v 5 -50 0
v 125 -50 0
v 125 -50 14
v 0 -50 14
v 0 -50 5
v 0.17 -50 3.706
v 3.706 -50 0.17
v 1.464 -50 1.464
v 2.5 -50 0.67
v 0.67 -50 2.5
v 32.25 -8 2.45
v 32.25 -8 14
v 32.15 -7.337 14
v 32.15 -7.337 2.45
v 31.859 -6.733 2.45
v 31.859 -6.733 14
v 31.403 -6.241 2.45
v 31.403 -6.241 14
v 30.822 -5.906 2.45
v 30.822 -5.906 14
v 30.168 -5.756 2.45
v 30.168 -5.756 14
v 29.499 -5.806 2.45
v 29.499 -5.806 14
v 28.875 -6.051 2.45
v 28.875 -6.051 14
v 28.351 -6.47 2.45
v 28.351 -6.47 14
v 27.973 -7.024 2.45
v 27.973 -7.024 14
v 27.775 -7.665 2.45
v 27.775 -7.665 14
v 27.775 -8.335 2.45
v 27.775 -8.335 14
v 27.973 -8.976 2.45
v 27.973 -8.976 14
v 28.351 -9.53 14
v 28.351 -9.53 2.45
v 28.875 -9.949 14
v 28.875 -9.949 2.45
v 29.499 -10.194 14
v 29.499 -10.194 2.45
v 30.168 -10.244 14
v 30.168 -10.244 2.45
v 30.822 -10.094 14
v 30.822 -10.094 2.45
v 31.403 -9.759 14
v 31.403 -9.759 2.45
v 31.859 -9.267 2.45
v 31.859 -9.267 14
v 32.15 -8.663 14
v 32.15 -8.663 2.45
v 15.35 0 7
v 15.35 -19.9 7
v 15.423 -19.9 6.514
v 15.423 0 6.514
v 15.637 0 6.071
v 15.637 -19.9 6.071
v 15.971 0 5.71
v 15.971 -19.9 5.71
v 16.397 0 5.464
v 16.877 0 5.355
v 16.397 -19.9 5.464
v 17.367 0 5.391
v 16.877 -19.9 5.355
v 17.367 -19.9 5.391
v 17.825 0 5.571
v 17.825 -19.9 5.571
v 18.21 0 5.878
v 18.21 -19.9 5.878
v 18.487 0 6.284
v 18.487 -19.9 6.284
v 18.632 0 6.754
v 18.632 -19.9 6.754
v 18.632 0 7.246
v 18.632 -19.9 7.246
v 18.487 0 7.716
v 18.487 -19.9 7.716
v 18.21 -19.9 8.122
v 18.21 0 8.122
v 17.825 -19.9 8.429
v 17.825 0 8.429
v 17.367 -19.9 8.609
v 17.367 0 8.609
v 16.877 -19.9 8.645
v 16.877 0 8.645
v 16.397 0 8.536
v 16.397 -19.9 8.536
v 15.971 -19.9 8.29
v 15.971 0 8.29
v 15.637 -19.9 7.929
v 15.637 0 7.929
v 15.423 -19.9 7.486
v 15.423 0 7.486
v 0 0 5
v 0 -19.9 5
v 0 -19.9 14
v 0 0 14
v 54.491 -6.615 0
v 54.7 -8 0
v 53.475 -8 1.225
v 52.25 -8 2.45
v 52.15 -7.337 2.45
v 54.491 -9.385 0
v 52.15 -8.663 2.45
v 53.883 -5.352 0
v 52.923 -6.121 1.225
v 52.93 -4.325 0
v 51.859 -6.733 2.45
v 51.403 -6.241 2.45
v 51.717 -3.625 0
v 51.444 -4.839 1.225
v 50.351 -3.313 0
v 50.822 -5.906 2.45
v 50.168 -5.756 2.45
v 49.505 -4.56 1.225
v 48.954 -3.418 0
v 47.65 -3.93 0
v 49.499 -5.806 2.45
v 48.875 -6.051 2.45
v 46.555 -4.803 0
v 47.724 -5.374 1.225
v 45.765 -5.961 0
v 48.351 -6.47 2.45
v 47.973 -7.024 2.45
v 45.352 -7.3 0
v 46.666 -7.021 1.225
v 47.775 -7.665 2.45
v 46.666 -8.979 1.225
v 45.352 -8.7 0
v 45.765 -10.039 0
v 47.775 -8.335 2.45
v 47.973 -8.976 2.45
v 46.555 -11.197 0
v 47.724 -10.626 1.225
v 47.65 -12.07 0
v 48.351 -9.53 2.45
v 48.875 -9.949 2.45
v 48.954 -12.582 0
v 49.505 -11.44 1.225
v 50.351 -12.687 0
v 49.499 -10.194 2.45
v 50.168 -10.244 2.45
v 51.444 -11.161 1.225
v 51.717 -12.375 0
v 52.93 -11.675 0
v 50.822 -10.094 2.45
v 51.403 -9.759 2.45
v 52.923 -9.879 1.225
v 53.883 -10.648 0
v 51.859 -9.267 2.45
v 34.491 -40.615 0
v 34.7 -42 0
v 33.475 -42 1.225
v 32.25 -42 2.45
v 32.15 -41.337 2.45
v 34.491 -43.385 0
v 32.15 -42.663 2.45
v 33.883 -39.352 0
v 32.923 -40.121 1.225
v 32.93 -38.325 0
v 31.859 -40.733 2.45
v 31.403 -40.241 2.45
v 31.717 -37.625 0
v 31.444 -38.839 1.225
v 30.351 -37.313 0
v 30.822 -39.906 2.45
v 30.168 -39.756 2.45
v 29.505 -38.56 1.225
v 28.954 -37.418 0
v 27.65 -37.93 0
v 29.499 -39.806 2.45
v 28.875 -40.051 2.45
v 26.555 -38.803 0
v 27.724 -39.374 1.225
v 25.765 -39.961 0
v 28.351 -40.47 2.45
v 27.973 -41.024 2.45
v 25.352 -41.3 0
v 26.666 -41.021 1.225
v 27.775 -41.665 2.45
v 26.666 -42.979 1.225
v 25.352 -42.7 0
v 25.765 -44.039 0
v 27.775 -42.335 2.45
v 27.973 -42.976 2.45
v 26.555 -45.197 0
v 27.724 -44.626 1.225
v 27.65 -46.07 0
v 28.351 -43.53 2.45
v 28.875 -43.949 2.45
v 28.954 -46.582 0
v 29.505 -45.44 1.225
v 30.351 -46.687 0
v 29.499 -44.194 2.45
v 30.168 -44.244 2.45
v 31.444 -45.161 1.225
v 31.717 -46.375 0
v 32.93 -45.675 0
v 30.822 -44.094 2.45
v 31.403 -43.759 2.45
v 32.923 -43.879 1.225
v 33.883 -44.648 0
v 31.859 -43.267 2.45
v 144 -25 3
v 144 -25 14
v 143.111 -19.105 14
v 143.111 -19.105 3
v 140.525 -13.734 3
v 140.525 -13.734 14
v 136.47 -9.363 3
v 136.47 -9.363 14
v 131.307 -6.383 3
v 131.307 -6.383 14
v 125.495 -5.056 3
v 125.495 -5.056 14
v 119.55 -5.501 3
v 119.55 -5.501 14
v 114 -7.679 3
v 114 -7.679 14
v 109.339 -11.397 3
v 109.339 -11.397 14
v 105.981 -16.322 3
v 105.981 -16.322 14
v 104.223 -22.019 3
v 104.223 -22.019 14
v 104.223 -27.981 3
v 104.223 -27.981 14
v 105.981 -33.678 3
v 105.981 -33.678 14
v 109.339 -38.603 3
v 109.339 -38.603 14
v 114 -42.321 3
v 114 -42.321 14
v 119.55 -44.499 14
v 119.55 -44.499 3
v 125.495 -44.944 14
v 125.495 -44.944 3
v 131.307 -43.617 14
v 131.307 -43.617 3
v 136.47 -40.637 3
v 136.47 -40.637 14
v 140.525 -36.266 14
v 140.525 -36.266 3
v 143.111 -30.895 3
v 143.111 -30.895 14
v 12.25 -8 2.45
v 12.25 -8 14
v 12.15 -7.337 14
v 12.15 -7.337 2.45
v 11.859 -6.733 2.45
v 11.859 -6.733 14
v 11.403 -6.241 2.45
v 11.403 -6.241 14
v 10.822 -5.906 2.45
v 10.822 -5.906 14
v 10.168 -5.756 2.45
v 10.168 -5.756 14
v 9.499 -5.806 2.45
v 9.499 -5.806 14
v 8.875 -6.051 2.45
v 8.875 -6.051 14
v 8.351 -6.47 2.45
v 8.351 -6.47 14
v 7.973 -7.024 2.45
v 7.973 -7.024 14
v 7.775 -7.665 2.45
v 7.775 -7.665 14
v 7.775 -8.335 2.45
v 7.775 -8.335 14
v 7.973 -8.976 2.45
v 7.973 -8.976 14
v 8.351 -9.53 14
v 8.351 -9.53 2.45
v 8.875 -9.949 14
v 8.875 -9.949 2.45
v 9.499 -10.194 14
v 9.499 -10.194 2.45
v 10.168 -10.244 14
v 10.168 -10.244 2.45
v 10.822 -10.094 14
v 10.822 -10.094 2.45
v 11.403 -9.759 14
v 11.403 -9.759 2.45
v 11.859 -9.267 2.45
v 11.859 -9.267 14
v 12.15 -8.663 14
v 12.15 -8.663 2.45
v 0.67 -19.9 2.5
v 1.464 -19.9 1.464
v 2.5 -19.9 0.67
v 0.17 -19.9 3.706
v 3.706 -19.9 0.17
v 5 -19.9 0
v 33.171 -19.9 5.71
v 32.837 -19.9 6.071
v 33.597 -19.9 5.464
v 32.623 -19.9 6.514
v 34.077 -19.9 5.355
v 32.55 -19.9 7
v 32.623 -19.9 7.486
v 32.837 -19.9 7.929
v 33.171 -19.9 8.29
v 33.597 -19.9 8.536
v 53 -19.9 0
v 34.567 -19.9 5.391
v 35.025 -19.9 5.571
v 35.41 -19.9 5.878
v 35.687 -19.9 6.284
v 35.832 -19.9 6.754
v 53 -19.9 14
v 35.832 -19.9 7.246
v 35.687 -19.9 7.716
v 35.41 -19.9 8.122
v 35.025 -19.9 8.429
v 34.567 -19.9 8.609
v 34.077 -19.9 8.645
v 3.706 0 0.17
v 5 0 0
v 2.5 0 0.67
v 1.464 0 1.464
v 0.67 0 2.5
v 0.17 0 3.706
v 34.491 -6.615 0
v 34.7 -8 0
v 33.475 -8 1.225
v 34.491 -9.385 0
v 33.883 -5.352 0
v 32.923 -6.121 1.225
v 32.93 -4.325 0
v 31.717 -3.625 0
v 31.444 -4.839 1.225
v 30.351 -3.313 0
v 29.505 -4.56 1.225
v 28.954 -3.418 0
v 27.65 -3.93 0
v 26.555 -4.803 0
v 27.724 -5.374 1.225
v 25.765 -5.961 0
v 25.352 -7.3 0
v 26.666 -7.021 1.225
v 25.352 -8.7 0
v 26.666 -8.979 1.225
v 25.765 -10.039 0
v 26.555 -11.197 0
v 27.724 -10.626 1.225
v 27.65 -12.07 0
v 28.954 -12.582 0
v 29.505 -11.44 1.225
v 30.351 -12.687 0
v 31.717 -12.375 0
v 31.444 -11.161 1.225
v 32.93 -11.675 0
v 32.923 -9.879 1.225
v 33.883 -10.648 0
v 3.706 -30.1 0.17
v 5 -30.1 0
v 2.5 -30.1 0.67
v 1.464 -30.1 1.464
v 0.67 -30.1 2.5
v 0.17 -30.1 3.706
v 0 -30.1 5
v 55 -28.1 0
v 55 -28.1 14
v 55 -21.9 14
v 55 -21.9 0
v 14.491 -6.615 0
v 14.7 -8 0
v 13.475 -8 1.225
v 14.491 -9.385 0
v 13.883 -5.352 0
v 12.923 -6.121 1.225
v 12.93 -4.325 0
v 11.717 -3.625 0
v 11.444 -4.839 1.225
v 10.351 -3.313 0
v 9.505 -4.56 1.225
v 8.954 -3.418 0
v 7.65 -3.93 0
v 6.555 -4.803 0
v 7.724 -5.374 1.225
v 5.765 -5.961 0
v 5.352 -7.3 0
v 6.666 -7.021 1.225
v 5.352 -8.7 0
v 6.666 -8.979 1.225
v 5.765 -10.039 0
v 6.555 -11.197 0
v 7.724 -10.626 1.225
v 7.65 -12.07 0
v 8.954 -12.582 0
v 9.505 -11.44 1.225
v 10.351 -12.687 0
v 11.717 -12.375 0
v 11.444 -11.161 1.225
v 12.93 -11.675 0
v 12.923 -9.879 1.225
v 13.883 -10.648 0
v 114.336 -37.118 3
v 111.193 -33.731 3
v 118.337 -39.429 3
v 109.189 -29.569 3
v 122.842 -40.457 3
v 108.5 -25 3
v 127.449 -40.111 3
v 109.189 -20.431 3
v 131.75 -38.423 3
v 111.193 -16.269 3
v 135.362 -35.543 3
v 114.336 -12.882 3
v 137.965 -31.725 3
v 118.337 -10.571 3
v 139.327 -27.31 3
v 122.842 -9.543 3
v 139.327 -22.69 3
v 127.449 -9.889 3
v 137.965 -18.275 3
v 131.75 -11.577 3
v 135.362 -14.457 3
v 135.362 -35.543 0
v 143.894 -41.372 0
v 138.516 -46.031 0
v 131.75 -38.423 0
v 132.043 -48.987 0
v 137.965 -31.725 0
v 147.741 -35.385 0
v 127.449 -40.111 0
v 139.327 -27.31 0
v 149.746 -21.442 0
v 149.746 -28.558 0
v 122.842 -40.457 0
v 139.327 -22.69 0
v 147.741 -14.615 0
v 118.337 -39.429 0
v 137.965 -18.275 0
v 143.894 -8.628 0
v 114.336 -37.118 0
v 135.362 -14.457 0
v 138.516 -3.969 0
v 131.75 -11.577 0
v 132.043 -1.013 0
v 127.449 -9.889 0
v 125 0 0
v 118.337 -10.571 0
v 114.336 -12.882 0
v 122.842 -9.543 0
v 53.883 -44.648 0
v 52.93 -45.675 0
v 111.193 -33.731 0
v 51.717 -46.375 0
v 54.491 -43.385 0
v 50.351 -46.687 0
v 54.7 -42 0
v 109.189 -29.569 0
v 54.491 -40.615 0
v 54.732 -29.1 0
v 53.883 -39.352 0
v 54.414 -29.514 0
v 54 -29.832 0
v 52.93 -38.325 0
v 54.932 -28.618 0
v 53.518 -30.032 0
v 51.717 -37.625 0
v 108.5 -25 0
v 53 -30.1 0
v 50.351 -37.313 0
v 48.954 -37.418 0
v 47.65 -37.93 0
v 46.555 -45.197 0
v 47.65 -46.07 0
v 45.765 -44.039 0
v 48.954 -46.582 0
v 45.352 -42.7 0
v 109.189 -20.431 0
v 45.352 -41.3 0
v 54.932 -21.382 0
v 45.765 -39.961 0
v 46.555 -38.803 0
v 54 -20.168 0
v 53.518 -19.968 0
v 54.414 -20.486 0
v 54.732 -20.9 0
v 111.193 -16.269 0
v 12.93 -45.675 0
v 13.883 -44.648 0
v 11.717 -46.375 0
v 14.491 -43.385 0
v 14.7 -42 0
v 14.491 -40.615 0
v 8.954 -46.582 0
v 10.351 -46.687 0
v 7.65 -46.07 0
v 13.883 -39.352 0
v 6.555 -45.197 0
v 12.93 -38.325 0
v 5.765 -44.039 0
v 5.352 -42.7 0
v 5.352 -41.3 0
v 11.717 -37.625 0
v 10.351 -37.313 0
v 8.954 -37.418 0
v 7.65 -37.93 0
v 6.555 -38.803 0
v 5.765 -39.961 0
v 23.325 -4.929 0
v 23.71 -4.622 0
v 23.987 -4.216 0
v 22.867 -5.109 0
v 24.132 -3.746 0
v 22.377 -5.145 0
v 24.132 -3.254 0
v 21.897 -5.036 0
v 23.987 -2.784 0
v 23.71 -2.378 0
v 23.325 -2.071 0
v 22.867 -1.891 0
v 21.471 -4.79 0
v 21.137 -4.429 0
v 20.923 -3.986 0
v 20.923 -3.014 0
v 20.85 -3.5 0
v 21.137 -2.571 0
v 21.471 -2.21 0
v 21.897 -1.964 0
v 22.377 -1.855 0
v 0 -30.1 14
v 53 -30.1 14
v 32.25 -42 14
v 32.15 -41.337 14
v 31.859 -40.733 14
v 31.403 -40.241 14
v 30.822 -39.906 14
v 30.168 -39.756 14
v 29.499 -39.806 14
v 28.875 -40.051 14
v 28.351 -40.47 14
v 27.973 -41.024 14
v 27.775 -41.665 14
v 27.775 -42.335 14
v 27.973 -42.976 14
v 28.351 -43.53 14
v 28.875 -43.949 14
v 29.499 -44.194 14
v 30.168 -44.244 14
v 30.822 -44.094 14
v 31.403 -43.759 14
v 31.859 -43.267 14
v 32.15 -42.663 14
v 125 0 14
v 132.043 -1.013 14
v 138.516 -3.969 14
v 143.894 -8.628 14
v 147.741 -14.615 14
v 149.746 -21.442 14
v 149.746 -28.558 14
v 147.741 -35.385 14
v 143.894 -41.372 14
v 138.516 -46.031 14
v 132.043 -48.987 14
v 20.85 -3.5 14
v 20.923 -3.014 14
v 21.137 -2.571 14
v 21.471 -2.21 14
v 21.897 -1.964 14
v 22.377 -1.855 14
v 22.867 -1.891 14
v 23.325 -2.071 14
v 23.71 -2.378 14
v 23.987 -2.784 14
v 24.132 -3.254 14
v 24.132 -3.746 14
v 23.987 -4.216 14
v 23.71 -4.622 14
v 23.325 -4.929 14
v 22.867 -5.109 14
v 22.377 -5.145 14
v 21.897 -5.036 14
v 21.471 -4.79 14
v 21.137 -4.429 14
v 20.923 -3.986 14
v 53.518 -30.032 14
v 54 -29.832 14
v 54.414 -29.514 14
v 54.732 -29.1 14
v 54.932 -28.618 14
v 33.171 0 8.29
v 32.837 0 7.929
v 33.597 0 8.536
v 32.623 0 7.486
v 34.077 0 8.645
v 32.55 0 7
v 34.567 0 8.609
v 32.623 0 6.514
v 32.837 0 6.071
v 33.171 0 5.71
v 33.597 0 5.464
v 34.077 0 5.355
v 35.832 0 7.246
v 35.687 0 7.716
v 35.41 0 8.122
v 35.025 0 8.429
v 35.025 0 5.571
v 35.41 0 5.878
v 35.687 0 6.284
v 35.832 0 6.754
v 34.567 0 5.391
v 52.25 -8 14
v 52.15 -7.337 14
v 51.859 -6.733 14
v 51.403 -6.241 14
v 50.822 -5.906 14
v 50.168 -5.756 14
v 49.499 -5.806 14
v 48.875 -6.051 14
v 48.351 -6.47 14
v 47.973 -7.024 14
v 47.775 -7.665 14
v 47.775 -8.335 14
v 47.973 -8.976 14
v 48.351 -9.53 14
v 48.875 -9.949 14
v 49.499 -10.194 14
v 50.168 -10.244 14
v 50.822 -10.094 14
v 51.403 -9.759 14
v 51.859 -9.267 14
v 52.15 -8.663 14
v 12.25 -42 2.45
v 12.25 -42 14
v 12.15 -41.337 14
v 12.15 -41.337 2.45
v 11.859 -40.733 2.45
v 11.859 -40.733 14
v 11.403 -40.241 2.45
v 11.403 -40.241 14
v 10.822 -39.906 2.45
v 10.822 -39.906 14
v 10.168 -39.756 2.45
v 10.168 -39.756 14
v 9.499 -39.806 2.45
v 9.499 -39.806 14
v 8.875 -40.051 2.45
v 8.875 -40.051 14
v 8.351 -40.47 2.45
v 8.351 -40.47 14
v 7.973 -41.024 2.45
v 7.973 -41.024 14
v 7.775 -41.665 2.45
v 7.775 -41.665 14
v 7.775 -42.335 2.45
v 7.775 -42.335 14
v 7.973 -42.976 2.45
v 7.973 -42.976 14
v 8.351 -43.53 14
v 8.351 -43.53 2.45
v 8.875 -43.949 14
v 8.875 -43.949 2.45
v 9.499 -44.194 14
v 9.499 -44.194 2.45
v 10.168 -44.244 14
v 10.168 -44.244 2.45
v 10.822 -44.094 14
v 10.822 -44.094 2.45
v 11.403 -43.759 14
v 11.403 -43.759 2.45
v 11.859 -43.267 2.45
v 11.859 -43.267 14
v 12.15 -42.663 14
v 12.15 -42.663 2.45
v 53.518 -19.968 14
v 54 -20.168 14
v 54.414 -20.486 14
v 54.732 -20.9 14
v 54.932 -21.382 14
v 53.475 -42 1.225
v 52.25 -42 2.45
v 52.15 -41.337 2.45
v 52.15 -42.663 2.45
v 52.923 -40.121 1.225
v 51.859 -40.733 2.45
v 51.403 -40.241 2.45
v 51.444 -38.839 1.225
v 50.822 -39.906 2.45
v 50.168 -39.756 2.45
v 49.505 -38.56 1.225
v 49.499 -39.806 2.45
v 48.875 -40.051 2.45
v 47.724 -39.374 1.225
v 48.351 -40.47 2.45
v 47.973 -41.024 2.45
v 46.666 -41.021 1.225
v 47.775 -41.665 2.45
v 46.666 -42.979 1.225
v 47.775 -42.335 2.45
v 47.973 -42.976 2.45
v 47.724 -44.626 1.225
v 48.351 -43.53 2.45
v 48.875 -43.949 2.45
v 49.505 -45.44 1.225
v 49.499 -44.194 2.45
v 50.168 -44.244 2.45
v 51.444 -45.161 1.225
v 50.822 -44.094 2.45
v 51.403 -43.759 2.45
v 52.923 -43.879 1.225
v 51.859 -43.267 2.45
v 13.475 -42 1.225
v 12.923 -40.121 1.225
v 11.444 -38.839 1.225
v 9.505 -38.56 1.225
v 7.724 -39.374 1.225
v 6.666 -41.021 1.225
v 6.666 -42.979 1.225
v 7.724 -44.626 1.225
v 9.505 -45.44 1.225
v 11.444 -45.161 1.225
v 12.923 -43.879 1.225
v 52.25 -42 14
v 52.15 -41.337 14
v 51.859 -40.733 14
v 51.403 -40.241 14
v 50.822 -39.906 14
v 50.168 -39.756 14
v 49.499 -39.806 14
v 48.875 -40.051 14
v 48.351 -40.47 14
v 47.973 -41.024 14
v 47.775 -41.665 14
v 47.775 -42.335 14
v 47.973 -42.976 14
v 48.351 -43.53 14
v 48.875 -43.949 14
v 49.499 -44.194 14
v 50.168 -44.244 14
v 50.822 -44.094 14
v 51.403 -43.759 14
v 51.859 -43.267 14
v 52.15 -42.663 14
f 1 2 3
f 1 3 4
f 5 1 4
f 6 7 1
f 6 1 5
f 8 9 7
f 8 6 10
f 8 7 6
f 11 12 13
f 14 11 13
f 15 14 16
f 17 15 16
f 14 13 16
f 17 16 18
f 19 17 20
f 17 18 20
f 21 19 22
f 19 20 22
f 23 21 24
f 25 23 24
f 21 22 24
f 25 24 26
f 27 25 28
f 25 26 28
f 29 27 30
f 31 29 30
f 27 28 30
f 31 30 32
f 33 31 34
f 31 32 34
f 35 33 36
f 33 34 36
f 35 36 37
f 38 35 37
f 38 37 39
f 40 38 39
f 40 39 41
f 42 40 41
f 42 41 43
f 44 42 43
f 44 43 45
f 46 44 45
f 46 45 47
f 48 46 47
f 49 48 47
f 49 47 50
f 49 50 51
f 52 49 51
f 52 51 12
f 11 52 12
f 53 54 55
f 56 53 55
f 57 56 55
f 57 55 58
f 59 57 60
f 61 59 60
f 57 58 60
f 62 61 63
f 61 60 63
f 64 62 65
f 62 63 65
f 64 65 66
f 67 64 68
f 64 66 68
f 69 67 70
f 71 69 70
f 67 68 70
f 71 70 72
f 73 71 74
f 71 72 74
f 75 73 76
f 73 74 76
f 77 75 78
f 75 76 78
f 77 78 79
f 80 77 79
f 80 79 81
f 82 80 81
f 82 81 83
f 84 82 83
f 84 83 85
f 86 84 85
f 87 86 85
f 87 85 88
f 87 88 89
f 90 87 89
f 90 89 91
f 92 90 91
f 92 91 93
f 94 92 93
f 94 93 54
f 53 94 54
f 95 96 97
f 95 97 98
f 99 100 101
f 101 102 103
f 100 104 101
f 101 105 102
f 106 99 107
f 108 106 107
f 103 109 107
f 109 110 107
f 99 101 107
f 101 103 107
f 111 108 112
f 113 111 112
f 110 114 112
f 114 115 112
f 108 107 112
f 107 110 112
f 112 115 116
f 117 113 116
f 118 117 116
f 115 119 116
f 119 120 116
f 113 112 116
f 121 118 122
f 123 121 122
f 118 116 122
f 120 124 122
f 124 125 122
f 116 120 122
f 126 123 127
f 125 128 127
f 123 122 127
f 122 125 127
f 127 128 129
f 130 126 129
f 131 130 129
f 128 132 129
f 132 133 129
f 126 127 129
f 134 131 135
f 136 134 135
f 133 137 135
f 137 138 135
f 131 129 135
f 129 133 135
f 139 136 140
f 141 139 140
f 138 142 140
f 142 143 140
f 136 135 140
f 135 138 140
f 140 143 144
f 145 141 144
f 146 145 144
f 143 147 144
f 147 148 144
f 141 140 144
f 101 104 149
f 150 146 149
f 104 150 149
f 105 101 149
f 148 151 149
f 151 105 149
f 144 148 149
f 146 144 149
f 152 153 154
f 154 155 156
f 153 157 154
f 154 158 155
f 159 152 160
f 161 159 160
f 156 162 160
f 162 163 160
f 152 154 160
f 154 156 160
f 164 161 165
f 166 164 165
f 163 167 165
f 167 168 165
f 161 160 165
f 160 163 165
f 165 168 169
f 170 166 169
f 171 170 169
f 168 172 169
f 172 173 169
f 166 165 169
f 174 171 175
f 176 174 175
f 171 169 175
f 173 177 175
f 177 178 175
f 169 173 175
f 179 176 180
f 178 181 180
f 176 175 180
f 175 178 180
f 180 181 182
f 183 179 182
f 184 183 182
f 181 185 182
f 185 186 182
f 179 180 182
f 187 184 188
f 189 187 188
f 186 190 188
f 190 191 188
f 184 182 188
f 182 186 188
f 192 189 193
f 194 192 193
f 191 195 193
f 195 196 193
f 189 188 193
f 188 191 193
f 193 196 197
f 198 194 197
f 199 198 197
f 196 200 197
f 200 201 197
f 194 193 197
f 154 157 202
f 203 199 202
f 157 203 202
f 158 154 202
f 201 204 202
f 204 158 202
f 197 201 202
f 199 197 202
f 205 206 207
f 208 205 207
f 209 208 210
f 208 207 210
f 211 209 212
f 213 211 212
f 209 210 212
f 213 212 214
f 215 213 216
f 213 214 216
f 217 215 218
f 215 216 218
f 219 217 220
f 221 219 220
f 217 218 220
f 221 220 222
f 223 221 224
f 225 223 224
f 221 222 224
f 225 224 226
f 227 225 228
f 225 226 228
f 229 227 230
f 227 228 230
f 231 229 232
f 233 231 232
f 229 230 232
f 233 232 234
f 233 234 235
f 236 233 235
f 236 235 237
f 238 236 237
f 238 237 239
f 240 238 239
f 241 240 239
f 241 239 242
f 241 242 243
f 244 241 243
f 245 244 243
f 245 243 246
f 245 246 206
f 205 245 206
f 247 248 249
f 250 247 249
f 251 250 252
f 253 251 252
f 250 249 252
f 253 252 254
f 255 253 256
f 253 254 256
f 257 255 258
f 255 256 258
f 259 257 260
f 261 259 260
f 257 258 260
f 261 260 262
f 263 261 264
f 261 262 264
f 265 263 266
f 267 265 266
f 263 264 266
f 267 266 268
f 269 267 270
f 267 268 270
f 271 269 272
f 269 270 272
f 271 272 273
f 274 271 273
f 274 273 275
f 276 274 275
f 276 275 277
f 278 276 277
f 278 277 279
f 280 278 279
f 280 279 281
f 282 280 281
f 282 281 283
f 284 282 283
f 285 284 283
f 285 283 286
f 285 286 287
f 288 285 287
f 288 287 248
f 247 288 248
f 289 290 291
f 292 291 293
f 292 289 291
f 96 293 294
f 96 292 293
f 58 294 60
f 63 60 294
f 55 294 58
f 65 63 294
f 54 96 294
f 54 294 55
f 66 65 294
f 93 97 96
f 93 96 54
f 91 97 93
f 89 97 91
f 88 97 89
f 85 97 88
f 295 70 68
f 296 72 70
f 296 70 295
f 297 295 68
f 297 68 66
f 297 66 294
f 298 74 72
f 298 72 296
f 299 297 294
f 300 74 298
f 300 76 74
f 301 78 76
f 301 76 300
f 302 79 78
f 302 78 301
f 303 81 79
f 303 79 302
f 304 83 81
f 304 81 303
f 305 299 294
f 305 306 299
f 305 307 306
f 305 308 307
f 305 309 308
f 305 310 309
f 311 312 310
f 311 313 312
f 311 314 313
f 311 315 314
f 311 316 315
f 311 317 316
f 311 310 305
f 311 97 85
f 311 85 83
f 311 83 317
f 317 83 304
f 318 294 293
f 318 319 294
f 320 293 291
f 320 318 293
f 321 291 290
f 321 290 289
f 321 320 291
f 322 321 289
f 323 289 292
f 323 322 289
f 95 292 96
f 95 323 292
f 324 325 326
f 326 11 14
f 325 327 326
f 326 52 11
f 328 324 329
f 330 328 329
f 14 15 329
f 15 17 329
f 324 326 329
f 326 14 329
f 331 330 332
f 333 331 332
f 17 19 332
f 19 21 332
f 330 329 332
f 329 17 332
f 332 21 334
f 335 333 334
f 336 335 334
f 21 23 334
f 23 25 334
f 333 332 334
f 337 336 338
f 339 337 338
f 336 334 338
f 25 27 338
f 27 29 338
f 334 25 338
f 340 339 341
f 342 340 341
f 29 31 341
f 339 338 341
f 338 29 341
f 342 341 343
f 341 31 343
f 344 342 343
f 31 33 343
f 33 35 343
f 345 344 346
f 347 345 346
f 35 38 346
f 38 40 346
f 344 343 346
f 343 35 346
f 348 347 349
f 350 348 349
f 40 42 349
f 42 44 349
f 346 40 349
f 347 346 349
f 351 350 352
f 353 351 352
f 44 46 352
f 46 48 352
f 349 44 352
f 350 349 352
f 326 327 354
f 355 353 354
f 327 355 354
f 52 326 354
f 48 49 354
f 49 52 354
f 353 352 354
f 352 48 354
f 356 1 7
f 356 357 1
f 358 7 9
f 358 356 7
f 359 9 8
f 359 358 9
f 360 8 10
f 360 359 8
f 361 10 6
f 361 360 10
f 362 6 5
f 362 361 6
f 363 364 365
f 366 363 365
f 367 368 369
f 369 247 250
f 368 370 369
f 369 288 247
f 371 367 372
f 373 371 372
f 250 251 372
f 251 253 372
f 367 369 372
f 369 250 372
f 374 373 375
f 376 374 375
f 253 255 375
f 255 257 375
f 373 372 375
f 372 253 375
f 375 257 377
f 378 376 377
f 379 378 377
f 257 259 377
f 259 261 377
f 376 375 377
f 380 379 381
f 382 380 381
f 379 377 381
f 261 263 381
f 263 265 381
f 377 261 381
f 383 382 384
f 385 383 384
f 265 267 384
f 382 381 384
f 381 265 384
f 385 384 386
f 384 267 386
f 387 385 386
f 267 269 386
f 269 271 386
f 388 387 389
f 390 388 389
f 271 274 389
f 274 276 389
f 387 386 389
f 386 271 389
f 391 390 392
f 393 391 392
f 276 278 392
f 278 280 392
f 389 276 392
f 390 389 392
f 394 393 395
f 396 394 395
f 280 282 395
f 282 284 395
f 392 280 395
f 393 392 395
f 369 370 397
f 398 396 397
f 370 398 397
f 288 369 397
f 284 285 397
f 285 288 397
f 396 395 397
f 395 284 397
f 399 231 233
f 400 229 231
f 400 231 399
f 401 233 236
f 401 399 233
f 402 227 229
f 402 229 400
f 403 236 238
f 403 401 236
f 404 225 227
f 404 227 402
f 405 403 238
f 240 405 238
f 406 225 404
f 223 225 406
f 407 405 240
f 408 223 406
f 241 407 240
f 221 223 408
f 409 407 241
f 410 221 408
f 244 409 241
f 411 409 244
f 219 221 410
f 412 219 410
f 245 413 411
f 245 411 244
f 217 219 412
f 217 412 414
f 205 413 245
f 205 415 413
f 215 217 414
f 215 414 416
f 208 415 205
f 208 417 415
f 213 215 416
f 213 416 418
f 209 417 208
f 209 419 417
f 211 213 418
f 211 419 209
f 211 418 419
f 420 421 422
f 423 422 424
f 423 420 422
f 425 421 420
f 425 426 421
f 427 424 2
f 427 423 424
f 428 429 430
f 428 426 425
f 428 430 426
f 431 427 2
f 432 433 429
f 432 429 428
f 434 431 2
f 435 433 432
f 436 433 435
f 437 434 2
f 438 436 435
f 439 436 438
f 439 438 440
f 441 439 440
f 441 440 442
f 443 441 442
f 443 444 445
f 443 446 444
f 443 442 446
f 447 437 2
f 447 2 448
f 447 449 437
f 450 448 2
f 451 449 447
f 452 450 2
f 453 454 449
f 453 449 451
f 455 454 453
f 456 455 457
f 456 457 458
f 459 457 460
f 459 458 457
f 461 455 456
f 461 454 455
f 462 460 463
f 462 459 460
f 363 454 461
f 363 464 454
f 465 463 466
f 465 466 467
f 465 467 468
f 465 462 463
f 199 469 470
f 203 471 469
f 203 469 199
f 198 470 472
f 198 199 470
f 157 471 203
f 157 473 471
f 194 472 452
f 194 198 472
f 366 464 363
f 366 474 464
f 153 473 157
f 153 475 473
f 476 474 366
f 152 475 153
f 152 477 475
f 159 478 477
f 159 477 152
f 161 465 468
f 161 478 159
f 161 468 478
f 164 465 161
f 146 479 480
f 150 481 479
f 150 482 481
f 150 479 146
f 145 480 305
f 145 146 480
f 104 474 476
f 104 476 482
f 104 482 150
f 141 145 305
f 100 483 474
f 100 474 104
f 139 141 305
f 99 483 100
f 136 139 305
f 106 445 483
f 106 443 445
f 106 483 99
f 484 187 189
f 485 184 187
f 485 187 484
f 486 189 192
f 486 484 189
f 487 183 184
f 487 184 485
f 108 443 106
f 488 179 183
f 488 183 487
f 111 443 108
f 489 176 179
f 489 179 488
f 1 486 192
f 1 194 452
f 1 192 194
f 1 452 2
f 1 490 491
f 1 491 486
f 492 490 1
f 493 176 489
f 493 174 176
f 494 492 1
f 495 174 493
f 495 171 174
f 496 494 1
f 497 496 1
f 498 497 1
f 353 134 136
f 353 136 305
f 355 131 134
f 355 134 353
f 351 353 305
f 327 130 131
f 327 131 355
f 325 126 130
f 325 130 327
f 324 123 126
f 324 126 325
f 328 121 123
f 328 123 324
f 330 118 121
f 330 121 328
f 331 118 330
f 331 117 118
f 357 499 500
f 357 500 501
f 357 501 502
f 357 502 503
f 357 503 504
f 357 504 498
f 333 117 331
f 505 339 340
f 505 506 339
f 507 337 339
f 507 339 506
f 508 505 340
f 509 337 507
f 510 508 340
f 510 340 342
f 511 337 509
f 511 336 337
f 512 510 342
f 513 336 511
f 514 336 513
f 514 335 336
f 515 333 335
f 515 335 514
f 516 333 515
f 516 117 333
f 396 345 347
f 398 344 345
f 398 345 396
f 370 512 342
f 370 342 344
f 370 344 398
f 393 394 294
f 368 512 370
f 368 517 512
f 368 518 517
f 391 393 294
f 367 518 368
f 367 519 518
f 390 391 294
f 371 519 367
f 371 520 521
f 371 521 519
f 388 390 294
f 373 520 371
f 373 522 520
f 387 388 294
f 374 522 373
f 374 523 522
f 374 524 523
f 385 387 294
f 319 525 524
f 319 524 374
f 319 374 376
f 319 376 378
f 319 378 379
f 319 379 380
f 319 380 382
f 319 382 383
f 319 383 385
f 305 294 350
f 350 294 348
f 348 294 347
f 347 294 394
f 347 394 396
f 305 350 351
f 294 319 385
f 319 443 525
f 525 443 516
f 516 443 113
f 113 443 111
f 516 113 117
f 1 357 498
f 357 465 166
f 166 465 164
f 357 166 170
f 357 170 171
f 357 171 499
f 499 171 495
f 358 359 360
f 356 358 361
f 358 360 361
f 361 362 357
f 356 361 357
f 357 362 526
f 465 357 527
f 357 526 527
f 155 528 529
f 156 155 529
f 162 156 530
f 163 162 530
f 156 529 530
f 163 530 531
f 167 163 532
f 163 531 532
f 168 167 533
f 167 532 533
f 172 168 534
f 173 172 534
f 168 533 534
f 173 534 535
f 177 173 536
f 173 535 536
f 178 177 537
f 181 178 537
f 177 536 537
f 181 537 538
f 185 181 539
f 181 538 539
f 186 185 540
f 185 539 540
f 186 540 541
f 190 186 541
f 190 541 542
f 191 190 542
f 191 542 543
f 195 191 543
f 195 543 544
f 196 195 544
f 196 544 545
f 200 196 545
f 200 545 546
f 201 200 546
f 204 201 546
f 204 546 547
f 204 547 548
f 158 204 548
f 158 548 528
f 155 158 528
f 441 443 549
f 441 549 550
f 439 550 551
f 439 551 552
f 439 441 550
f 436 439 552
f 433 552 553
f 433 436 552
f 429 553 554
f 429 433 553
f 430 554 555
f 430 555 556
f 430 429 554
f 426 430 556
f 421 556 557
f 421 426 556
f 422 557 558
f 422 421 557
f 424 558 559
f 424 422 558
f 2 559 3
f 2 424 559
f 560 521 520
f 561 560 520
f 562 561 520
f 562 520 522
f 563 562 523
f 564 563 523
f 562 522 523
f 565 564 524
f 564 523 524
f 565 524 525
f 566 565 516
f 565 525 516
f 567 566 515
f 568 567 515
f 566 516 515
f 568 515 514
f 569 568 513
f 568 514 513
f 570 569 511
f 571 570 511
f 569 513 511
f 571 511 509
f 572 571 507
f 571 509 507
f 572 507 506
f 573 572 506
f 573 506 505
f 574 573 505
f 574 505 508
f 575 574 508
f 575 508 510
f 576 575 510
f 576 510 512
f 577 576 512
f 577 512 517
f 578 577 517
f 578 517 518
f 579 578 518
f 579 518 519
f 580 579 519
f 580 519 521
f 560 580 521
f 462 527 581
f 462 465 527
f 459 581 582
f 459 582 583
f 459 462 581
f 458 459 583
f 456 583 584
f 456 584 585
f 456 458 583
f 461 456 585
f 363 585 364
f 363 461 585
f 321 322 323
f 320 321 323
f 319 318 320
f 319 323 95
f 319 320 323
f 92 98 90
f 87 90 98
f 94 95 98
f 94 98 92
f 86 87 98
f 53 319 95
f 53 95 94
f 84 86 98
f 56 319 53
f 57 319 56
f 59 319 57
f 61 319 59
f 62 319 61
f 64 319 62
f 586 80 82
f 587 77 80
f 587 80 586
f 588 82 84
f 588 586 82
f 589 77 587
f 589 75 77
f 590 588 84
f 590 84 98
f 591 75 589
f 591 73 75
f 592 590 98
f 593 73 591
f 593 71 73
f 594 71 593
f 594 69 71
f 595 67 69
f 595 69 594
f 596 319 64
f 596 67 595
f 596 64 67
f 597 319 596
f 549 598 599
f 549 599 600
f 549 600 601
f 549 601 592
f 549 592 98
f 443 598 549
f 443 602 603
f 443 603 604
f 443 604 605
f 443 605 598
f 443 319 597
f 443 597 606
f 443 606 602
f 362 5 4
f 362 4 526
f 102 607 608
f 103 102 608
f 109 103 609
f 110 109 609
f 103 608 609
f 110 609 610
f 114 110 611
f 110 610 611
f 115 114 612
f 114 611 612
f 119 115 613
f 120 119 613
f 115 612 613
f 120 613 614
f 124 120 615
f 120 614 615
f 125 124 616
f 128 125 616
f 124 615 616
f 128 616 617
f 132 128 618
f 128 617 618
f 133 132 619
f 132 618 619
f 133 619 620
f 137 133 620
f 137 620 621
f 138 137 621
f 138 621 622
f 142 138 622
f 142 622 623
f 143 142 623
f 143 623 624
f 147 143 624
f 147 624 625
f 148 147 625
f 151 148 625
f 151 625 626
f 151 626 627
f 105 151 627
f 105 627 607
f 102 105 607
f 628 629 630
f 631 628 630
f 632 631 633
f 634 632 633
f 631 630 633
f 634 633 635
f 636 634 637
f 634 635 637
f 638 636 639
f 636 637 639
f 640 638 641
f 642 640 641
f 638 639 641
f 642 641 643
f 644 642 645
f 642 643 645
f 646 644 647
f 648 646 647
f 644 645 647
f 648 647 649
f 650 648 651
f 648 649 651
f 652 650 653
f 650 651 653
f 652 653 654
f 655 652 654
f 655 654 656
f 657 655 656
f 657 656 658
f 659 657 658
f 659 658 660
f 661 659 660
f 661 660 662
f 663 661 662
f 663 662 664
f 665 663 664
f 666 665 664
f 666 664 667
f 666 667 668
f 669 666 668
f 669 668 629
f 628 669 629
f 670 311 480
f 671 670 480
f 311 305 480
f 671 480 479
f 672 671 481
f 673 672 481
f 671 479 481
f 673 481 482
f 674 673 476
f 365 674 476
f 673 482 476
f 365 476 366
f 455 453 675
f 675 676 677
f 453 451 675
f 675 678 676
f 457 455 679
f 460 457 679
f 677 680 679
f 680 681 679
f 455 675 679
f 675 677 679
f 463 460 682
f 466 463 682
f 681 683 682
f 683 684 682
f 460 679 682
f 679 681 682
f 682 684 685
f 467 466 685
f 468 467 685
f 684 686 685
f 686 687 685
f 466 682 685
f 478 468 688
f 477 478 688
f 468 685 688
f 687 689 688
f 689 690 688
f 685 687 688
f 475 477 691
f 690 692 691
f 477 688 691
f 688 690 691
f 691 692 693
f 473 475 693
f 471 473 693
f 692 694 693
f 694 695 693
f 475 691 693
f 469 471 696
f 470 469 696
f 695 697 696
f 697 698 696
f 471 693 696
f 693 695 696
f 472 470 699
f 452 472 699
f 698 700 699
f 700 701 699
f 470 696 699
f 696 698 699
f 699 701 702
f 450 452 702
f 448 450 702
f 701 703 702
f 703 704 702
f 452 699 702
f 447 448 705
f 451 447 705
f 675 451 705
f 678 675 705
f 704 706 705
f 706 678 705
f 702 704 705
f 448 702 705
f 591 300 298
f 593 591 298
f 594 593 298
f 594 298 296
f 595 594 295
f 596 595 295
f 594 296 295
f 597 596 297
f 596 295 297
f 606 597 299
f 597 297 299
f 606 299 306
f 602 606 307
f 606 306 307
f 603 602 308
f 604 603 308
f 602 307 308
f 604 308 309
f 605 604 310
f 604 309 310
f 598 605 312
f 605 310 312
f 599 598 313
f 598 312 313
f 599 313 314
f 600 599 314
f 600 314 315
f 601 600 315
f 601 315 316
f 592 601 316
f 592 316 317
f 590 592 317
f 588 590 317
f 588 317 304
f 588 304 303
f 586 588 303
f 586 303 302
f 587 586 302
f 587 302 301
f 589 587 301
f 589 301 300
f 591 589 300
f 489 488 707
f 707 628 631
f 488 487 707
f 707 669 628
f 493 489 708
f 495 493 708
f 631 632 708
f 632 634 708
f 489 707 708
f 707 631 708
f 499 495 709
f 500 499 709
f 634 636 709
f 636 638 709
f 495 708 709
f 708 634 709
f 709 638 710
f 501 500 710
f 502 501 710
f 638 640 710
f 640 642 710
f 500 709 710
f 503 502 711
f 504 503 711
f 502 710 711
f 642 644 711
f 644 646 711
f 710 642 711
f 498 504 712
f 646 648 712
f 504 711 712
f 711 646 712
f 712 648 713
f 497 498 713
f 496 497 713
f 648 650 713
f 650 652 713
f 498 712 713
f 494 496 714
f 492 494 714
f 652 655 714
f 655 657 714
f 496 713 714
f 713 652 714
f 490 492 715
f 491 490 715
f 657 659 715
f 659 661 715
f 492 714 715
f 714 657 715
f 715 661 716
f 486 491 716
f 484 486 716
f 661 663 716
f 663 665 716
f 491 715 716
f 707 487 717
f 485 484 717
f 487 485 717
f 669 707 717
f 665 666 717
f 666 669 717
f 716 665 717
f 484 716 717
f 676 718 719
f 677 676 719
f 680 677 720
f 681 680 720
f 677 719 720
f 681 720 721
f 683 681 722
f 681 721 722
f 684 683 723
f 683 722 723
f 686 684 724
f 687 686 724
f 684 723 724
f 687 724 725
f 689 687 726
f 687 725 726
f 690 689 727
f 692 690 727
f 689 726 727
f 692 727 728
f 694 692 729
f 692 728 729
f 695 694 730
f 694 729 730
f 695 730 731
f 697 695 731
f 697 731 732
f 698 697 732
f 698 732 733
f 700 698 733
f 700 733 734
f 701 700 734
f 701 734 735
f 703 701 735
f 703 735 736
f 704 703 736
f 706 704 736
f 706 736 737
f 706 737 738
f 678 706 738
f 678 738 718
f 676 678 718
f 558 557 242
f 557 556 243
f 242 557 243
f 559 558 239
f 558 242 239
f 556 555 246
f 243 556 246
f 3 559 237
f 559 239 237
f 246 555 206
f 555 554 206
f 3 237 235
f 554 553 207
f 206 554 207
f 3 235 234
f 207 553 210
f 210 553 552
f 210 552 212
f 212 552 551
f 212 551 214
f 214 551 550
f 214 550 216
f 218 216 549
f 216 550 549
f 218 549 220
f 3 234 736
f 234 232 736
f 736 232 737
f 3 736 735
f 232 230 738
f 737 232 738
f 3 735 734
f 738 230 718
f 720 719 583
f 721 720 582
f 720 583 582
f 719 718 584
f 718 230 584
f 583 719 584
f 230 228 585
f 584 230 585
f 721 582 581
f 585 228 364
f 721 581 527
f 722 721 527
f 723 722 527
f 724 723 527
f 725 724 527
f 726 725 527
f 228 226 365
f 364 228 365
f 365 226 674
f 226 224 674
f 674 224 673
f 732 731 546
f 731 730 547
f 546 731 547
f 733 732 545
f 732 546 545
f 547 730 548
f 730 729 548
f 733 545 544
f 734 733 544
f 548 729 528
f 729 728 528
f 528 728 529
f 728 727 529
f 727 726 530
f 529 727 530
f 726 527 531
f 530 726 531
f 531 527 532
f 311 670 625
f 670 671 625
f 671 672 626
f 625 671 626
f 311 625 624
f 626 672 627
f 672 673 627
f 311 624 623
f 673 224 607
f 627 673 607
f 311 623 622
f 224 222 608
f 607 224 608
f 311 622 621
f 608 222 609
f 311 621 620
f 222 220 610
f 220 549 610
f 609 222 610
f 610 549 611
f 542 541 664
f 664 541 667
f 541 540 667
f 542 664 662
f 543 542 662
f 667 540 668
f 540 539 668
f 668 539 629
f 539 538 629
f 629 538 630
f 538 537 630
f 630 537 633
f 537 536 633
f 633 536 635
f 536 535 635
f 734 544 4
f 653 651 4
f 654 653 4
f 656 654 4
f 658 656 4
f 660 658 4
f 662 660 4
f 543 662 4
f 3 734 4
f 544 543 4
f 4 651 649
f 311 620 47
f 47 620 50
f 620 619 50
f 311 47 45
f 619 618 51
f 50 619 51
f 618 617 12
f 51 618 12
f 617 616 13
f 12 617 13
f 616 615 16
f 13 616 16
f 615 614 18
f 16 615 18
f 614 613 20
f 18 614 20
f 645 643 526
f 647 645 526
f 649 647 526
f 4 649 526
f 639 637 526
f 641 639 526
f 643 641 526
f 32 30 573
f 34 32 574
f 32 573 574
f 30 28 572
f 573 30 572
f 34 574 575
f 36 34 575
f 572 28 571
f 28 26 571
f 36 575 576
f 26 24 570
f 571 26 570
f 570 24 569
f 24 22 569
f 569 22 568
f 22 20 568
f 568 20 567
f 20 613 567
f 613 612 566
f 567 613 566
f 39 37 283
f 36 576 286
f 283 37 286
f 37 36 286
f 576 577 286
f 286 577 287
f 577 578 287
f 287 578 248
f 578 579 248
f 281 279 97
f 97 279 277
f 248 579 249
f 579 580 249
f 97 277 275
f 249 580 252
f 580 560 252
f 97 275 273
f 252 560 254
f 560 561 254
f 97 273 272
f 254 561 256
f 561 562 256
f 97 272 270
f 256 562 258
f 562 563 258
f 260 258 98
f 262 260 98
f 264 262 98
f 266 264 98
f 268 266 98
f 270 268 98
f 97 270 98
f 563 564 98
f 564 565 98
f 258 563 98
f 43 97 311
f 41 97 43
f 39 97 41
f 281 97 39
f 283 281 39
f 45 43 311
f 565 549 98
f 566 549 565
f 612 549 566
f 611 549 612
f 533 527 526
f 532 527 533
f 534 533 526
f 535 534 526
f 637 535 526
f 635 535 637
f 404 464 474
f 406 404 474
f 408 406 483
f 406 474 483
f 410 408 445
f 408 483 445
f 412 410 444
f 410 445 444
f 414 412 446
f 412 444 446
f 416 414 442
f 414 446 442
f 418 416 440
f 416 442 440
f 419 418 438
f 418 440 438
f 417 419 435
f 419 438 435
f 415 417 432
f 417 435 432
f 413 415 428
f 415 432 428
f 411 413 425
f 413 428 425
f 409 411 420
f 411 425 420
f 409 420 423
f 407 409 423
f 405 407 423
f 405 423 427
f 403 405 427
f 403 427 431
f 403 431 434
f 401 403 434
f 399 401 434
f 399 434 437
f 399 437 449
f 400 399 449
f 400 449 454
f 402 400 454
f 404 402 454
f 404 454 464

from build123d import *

# Parameters (mm, degrees)
BOSS_EXTRUDE1_DEPTH       = 14
SKETCH2_W                 = 55
SKETCH2_H                 = 10.2
CUT_EXTRUDE1_DEPTH        = 15
F_8_CLEARANCE_HOLE1_D     = 4.5
F_8_CLEARANCE_HOLE1_DEPTH = 14
F_4_CLEARANCE_HOLE1_D     = 3.3
F_4_CLEARANCE_HOLE1_DEPTH = 14
F_4_CLEARANCE_HOLE2_D     = 3.3
F_4_CLEARANCE_HOLE2_DEPTH = 19.899999999
HOLE1_D                   = 31.000000009
HOLE1_DEPTH               = 14
HOLE1_CBORE_D             = 40.00000001
HOLE1_CBORE_DEPTH         = 11
CHAMFER1_SIZE             = 2.45
FILLET1_R                 = 2
FILLET2_R                 = 5


with BuildPart() as part:
    # Sketch1 → Boss-Extrude1 (new body)
    with BuildSketch(Plane(origin=(0, 0, 0), x_dir=(-1, 0, 0), z_dir=(0, 0, -1))):
        with BuildLine():
            Line((-125, -50), (0, -50))
            Line((0, -50), (0, 0))
            Line((0, 0), (-125, 0))
            ThreePointArc((-125, 0), (-150, -25), (-125, -50))
        make_face()
    extrude(amount=-BOSS_EXTRUDE1_DEPTH)

    # Sketch2 → Cut-Extrude1 (cut, through all)
    with BuildSketch(Plane.XY.offset(14)):
        with Locations((27.5, -24.999999999)):
            Rectangle(SKETCH2_W, SKETCH2_H)
    extrude(amount=-CUT_EXTRUDE1_DEPTH, mode=Mode.SUBTRACT)

    # #8 Clearance Hole1
    with Locations(Plane(origin=(0, 0, 0), x_dir=(-1, 0, 0), z_dir=(0, 0, -1))):
        with Locations((-10, -8), (-10, -42), (-30, -42), (-30, -8), (-50, -8), (-50, -42)):
            Hole(F_8_CLEARANCE_HOLE1_D / 2, depth=F_8_CLEARANCE_HOLE1_DEPTH)

    # #4 Clearance Hole1
    with Locations(Plane.XY.offset(14)):
        with Locations((22.5, -3.5)):
            Hole(F_4_CLEARANCE_HOLE1_D / 2, depth=F_4_CLEARANCE_HOLE1_DEPTH)

    # #4 Clearance Hole2
    with Locations(Plane(origin=(0, 0, 0), x_dir=(1, 0, 0), z_dir=(0, 1, 0))):
        with Locations((17, -7), (34.2, -7)):
            Hole(F_4_CLEARANCE_HOLE2_D / 2, depth=F_4_CLEARANCE_HOLE2_DEPTH)

    # Hole1
    with Locations(Plane.XY.offset(14)):
        with Locations((123.999999995, -24.999999999)):
            CounterBoreHole(HOLE1_D / 2, HOLE1_CBORE_D / 2, HOLE1_CBORE_DEPTH, depth=HOLE1_DEPTH)

    # Chamfer1
    chamfer1_edges = [part.edges().sort_by_distance(p)[0] for p in [
        (47.75, -42, 0),
        (47.75, -8, 0),
        (27.75, -8, 0),
        (27.75, -42, 0),
        (7.75, -42, 0),
        (7.75, -8, 0),
    ]]
    chamfer(chamfer1_edges, length=CHAMFER1_SIZE)

    # Fillet1
    fillet1_edges = [part.edges().sort_by_distance(p)[0] for p in [
        (55, -19.899999999, 7),
        (55, -30.099999999, 7),
    ]]
    fillet(fillet1_edges, radius=FILLET1_R)

    # Fillet2
    fillet2_edges = [part.edges().sort_by_distance(p)[0] for p in [
        (0, -9.95, 0),
        (0, -40.05, 0),
    ]]
    fillet(fillet2_edges, radius=FILLET2_R)


solid = part.part
